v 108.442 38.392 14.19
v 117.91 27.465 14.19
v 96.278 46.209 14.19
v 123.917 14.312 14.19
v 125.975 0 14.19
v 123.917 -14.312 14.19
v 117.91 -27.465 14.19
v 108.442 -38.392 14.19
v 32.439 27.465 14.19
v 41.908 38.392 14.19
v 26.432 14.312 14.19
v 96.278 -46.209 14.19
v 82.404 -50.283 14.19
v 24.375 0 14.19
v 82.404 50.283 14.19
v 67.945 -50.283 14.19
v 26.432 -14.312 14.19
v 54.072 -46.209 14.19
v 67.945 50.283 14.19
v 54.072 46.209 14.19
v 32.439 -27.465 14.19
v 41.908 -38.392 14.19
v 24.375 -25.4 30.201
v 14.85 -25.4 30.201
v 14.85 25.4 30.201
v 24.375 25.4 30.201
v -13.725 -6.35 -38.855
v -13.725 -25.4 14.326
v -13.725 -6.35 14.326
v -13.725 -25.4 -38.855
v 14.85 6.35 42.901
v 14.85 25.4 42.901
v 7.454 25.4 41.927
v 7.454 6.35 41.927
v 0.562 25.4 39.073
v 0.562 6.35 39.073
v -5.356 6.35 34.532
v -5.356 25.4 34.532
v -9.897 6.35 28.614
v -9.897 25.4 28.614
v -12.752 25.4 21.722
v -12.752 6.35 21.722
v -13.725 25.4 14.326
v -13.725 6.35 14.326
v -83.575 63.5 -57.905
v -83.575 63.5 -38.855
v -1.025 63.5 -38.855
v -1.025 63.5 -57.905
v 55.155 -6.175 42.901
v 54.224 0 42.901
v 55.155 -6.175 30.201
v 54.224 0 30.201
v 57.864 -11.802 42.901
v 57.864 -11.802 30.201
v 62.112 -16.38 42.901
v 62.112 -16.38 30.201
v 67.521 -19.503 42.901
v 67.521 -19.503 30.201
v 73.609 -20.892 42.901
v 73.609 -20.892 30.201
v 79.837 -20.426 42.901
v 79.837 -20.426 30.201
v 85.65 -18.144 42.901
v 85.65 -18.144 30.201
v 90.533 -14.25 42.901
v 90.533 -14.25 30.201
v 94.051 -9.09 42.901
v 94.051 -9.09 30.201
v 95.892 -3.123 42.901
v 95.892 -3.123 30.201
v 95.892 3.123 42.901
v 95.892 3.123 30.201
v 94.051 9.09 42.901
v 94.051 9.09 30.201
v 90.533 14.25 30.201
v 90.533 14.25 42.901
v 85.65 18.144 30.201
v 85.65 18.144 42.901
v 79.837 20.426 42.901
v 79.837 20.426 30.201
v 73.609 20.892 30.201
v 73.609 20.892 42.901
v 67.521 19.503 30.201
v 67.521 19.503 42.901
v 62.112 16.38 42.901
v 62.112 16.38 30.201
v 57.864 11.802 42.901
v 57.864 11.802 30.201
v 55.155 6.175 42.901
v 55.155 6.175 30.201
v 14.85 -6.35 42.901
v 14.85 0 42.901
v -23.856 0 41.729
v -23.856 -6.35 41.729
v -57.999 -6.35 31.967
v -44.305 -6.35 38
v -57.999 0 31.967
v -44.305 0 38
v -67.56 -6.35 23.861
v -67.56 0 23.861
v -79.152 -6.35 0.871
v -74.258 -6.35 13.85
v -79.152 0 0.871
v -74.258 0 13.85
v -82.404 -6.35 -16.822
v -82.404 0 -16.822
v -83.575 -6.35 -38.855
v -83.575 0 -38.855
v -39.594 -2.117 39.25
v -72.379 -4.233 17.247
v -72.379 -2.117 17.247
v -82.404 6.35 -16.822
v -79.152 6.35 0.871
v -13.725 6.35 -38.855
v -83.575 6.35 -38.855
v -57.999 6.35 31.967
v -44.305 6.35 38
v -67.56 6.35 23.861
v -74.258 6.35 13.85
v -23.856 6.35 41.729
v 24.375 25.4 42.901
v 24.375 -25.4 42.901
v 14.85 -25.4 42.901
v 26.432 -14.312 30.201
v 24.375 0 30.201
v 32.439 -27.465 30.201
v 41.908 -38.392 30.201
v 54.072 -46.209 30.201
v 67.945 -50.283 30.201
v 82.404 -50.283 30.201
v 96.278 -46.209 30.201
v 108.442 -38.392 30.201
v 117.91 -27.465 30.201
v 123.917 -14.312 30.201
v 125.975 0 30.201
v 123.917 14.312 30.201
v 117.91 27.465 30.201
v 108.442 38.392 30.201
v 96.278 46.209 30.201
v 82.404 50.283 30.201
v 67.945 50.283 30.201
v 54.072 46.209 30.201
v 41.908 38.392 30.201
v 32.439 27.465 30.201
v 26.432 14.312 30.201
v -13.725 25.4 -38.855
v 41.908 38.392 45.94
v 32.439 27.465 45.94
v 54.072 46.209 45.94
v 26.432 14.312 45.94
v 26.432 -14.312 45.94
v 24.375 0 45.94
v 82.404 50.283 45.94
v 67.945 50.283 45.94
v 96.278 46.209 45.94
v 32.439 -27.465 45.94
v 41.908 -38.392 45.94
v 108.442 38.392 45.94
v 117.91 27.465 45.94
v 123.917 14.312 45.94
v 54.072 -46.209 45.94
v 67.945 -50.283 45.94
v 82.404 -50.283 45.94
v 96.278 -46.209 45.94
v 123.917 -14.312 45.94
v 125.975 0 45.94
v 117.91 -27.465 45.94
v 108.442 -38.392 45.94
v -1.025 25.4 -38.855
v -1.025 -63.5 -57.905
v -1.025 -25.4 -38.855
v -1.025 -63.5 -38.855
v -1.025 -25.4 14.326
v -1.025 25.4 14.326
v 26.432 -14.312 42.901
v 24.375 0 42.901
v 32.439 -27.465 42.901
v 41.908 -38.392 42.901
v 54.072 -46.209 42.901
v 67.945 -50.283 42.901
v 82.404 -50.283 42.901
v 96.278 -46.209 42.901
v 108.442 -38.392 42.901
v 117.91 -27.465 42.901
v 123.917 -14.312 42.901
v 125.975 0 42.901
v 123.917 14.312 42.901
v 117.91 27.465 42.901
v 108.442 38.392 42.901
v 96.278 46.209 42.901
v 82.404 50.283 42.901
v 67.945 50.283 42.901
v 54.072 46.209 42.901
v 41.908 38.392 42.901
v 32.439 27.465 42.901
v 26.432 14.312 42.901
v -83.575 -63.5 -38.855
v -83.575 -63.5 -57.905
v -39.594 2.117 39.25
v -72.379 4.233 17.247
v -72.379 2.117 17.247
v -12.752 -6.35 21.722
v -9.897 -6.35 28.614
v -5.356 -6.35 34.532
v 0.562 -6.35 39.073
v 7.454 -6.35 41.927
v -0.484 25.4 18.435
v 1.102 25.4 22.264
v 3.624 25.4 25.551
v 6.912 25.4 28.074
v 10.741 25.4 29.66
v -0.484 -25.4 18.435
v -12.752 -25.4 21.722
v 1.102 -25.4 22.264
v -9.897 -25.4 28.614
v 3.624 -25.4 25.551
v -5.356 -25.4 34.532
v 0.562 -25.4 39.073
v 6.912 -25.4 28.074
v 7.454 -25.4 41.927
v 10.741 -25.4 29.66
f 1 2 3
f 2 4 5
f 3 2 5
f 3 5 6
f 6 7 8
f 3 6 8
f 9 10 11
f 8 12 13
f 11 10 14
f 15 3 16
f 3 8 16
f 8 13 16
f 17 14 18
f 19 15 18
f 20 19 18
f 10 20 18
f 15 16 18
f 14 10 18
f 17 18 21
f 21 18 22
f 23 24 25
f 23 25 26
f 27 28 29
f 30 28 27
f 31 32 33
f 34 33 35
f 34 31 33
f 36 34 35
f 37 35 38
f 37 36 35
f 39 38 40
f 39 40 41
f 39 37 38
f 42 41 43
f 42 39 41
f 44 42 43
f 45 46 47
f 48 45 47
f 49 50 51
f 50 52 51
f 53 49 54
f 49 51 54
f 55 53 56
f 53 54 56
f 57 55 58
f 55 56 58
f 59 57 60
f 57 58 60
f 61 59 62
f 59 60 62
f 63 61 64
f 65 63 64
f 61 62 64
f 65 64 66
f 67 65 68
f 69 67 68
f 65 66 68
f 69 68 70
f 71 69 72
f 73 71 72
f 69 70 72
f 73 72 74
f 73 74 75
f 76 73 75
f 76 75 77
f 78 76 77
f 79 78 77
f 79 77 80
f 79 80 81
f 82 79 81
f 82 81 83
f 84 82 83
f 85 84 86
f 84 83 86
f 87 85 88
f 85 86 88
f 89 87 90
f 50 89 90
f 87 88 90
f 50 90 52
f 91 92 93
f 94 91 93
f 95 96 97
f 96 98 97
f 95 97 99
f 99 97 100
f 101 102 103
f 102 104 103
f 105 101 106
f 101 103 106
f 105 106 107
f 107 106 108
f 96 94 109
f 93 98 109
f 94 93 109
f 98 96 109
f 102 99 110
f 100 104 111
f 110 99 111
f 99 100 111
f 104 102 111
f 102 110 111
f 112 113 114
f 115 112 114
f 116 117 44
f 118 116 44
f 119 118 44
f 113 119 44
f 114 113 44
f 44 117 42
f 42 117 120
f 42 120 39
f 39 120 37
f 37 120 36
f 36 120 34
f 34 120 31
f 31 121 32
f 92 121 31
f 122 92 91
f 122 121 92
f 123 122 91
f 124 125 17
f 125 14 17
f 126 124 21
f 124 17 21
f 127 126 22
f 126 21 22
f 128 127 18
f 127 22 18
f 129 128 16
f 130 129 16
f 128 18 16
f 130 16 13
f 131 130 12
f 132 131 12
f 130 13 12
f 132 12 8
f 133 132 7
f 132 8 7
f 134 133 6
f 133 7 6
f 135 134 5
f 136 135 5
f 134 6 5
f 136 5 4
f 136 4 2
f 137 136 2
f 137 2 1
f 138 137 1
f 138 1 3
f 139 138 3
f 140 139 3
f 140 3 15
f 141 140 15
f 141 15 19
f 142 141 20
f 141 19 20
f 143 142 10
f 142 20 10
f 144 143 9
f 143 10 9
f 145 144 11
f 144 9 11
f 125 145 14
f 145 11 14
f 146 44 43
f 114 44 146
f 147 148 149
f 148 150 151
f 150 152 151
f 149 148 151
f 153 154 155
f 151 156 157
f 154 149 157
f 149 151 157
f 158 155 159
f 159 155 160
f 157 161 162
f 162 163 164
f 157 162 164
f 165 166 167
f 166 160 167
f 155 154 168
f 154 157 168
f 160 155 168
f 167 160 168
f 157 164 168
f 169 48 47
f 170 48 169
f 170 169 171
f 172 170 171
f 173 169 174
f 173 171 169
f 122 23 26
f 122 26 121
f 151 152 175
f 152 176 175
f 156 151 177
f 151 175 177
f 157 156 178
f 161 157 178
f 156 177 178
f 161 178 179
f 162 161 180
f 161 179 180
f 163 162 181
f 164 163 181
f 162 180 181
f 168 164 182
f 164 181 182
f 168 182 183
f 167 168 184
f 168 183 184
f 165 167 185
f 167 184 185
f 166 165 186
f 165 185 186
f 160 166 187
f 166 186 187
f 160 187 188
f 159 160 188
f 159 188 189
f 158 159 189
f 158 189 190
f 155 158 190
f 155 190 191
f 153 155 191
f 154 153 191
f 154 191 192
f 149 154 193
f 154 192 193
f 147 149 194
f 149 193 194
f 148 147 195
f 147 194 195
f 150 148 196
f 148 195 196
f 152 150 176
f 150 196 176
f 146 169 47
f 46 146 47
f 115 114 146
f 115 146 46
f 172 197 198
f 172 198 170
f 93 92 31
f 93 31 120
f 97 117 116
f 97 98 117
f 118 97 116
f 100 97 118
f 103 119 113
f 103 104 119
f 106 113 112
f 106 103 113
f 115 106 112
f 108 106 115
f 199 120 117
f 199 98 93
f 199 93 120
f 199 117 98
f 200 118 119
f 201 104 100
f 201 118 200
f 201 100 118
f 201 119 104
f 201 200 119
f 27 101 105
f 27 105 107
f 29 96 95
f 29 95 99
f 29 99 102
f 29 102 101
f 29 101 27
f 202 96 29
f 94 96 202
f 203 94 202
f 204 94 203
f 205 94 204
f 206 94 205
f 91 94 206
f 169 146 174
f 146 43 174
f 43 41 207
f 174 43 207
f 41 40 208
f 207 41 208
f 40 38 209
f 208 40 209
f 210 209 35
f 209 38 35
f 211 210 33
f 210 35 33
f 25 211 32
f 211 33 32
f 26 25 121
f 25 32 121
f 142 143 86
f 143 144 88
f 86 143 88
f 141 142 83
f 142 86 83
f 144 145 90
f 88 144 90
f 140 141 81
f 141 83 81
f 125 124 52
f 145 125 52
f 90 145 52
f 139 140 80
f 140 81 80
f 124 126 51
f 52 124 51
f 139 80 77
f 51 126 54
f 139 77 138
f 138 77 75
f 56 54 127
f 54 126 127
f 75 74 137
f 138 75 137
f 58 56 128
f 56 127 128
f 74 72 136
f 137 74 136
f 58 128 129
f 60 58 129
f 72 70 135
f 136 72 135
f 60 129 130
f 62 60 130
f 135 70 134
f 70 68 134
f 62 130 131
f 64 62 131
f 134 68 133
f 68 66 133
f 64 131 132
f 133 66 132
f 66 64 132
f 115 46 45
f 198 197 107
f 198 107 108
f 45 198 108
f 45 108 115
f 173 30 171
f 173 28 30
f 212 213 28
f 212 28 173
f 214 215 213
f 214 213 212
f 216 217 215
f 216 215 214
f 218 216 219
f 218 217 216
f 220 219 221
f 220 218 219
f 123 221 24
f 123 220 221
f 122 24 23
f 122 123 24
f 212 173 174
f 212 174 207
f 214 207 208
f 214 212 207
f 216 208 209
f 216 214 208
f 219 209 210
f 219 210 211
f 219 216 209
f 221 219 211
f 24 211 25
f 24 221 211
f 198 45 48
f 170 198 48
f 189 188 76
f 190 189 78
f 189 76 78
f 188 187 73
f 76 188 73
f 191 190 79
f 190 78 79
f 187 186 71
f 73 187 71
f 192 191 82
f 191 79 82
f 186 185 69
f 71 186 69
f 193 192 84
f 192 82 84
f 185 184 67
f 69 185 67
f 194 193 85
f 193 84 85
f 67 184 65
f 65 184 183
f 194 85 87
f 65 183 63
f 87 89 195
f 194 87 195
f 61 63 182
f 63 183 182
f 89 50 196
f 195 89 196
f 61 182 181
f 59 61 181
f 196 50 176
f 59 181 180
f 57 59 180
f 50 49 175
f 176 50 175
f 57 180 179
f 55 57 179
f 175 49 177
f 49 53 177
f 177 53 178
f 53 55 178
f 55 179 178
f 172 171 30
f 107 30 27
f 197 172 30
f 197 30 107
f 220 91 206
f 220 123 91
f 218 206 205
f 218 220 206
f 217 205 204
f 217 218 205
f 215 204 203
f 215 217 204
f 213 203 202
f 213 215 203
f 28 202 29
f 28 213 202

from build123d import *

# Parameters (mm, degrees)
F1_DEPTH = 63.5
F2_DEPTH = 25.4
F3_DEPTH = 6.35


with BuildPart() as f1:
    # F0 (on Front) → F1 (new body, symmetric)
    with BuildSketch(Plane.XZ):
        Polygon((-83.575267, -38.855243), (-83.575267, -57.905243), (-1.025267, -57.905243), (-1.025267, -38.855243), (-13.725268, -38.855243), align=None)
    extrude(amount=F1_DEPTH, both=True)

    # F0 (on Front) → F2 (join, symmetric)
    with BuildSketch(Plane.XZ):
        with BuildLine():
            Line((-13.725268, -38.855243), (-1.025267, -38.855243))
            Line((-1.025267, -38.855243), (-1.025267, 14.326012))
            ThreePointArc((-1.025267, 14.326012), (3.624413, 25.551333), (14.849733, 30.201012))
            Line((14.849733, 30.201012), (24.374733, 30.201012))
            Line((24.374733, 30.201012), (24.374733, 42.901013))
            Line((24.374733, 42.901013), (14.849733, 42.901013))
            ThreePointArc((14.849733, 42.901013), (-5.355844, 34.531589), (-13.725268, 14.326012))
            Line((-13.725268, 14.326012), (-13.725268, -38.855243))
        make_face()
    extrude(amount=F2_DEPTH, both=True)

    # F0 (on Front) → F3 (join, symmetric)
    with BuildSketch(Plane.XZ):
        with BuildLine():
            add(Edge.make_bspline(
                [(14.849733, 42.901013), (-50.447308, 43.177892), (-83.148681, 39.544407), (-83.575267, -38.855243)],
                knots=[0, 0, 0, 0, 127.951421, 127.951421, 127.951421, 127.951421], degree=3))
            Line((-83.575267, -38.855243), (-13.725268, -38.855243))
            Line((-13.725268, -38.855243), (-13.725268, 14.326012))
            ThreePointArc((-13.725268, 14.326012), (-5.355844, 34.531589), (14.849733, 42.901013))
        make_face()
    extrude(amount=F3_DEPTH, both=True)


with BuildPart() as f4:
    # F0 (on Front) → F4 (revolve)
    with BuildSketch(Plane.XZ):
        Polygon((24.374733, 45.939848), (24.374733, 42.901013), (54.22392, 42.901013), (54.22392, 30.201012), (24.374733, 30.201012), (24.374733, 14.189848), (75.174733, 14.189848), (75.174733, 45.939848), align=None)
    revolve(axis=Axis((75.174733, 0, 30.064848), (0, 0, 1)))


solid = Compound([f1.part, f4.part])
